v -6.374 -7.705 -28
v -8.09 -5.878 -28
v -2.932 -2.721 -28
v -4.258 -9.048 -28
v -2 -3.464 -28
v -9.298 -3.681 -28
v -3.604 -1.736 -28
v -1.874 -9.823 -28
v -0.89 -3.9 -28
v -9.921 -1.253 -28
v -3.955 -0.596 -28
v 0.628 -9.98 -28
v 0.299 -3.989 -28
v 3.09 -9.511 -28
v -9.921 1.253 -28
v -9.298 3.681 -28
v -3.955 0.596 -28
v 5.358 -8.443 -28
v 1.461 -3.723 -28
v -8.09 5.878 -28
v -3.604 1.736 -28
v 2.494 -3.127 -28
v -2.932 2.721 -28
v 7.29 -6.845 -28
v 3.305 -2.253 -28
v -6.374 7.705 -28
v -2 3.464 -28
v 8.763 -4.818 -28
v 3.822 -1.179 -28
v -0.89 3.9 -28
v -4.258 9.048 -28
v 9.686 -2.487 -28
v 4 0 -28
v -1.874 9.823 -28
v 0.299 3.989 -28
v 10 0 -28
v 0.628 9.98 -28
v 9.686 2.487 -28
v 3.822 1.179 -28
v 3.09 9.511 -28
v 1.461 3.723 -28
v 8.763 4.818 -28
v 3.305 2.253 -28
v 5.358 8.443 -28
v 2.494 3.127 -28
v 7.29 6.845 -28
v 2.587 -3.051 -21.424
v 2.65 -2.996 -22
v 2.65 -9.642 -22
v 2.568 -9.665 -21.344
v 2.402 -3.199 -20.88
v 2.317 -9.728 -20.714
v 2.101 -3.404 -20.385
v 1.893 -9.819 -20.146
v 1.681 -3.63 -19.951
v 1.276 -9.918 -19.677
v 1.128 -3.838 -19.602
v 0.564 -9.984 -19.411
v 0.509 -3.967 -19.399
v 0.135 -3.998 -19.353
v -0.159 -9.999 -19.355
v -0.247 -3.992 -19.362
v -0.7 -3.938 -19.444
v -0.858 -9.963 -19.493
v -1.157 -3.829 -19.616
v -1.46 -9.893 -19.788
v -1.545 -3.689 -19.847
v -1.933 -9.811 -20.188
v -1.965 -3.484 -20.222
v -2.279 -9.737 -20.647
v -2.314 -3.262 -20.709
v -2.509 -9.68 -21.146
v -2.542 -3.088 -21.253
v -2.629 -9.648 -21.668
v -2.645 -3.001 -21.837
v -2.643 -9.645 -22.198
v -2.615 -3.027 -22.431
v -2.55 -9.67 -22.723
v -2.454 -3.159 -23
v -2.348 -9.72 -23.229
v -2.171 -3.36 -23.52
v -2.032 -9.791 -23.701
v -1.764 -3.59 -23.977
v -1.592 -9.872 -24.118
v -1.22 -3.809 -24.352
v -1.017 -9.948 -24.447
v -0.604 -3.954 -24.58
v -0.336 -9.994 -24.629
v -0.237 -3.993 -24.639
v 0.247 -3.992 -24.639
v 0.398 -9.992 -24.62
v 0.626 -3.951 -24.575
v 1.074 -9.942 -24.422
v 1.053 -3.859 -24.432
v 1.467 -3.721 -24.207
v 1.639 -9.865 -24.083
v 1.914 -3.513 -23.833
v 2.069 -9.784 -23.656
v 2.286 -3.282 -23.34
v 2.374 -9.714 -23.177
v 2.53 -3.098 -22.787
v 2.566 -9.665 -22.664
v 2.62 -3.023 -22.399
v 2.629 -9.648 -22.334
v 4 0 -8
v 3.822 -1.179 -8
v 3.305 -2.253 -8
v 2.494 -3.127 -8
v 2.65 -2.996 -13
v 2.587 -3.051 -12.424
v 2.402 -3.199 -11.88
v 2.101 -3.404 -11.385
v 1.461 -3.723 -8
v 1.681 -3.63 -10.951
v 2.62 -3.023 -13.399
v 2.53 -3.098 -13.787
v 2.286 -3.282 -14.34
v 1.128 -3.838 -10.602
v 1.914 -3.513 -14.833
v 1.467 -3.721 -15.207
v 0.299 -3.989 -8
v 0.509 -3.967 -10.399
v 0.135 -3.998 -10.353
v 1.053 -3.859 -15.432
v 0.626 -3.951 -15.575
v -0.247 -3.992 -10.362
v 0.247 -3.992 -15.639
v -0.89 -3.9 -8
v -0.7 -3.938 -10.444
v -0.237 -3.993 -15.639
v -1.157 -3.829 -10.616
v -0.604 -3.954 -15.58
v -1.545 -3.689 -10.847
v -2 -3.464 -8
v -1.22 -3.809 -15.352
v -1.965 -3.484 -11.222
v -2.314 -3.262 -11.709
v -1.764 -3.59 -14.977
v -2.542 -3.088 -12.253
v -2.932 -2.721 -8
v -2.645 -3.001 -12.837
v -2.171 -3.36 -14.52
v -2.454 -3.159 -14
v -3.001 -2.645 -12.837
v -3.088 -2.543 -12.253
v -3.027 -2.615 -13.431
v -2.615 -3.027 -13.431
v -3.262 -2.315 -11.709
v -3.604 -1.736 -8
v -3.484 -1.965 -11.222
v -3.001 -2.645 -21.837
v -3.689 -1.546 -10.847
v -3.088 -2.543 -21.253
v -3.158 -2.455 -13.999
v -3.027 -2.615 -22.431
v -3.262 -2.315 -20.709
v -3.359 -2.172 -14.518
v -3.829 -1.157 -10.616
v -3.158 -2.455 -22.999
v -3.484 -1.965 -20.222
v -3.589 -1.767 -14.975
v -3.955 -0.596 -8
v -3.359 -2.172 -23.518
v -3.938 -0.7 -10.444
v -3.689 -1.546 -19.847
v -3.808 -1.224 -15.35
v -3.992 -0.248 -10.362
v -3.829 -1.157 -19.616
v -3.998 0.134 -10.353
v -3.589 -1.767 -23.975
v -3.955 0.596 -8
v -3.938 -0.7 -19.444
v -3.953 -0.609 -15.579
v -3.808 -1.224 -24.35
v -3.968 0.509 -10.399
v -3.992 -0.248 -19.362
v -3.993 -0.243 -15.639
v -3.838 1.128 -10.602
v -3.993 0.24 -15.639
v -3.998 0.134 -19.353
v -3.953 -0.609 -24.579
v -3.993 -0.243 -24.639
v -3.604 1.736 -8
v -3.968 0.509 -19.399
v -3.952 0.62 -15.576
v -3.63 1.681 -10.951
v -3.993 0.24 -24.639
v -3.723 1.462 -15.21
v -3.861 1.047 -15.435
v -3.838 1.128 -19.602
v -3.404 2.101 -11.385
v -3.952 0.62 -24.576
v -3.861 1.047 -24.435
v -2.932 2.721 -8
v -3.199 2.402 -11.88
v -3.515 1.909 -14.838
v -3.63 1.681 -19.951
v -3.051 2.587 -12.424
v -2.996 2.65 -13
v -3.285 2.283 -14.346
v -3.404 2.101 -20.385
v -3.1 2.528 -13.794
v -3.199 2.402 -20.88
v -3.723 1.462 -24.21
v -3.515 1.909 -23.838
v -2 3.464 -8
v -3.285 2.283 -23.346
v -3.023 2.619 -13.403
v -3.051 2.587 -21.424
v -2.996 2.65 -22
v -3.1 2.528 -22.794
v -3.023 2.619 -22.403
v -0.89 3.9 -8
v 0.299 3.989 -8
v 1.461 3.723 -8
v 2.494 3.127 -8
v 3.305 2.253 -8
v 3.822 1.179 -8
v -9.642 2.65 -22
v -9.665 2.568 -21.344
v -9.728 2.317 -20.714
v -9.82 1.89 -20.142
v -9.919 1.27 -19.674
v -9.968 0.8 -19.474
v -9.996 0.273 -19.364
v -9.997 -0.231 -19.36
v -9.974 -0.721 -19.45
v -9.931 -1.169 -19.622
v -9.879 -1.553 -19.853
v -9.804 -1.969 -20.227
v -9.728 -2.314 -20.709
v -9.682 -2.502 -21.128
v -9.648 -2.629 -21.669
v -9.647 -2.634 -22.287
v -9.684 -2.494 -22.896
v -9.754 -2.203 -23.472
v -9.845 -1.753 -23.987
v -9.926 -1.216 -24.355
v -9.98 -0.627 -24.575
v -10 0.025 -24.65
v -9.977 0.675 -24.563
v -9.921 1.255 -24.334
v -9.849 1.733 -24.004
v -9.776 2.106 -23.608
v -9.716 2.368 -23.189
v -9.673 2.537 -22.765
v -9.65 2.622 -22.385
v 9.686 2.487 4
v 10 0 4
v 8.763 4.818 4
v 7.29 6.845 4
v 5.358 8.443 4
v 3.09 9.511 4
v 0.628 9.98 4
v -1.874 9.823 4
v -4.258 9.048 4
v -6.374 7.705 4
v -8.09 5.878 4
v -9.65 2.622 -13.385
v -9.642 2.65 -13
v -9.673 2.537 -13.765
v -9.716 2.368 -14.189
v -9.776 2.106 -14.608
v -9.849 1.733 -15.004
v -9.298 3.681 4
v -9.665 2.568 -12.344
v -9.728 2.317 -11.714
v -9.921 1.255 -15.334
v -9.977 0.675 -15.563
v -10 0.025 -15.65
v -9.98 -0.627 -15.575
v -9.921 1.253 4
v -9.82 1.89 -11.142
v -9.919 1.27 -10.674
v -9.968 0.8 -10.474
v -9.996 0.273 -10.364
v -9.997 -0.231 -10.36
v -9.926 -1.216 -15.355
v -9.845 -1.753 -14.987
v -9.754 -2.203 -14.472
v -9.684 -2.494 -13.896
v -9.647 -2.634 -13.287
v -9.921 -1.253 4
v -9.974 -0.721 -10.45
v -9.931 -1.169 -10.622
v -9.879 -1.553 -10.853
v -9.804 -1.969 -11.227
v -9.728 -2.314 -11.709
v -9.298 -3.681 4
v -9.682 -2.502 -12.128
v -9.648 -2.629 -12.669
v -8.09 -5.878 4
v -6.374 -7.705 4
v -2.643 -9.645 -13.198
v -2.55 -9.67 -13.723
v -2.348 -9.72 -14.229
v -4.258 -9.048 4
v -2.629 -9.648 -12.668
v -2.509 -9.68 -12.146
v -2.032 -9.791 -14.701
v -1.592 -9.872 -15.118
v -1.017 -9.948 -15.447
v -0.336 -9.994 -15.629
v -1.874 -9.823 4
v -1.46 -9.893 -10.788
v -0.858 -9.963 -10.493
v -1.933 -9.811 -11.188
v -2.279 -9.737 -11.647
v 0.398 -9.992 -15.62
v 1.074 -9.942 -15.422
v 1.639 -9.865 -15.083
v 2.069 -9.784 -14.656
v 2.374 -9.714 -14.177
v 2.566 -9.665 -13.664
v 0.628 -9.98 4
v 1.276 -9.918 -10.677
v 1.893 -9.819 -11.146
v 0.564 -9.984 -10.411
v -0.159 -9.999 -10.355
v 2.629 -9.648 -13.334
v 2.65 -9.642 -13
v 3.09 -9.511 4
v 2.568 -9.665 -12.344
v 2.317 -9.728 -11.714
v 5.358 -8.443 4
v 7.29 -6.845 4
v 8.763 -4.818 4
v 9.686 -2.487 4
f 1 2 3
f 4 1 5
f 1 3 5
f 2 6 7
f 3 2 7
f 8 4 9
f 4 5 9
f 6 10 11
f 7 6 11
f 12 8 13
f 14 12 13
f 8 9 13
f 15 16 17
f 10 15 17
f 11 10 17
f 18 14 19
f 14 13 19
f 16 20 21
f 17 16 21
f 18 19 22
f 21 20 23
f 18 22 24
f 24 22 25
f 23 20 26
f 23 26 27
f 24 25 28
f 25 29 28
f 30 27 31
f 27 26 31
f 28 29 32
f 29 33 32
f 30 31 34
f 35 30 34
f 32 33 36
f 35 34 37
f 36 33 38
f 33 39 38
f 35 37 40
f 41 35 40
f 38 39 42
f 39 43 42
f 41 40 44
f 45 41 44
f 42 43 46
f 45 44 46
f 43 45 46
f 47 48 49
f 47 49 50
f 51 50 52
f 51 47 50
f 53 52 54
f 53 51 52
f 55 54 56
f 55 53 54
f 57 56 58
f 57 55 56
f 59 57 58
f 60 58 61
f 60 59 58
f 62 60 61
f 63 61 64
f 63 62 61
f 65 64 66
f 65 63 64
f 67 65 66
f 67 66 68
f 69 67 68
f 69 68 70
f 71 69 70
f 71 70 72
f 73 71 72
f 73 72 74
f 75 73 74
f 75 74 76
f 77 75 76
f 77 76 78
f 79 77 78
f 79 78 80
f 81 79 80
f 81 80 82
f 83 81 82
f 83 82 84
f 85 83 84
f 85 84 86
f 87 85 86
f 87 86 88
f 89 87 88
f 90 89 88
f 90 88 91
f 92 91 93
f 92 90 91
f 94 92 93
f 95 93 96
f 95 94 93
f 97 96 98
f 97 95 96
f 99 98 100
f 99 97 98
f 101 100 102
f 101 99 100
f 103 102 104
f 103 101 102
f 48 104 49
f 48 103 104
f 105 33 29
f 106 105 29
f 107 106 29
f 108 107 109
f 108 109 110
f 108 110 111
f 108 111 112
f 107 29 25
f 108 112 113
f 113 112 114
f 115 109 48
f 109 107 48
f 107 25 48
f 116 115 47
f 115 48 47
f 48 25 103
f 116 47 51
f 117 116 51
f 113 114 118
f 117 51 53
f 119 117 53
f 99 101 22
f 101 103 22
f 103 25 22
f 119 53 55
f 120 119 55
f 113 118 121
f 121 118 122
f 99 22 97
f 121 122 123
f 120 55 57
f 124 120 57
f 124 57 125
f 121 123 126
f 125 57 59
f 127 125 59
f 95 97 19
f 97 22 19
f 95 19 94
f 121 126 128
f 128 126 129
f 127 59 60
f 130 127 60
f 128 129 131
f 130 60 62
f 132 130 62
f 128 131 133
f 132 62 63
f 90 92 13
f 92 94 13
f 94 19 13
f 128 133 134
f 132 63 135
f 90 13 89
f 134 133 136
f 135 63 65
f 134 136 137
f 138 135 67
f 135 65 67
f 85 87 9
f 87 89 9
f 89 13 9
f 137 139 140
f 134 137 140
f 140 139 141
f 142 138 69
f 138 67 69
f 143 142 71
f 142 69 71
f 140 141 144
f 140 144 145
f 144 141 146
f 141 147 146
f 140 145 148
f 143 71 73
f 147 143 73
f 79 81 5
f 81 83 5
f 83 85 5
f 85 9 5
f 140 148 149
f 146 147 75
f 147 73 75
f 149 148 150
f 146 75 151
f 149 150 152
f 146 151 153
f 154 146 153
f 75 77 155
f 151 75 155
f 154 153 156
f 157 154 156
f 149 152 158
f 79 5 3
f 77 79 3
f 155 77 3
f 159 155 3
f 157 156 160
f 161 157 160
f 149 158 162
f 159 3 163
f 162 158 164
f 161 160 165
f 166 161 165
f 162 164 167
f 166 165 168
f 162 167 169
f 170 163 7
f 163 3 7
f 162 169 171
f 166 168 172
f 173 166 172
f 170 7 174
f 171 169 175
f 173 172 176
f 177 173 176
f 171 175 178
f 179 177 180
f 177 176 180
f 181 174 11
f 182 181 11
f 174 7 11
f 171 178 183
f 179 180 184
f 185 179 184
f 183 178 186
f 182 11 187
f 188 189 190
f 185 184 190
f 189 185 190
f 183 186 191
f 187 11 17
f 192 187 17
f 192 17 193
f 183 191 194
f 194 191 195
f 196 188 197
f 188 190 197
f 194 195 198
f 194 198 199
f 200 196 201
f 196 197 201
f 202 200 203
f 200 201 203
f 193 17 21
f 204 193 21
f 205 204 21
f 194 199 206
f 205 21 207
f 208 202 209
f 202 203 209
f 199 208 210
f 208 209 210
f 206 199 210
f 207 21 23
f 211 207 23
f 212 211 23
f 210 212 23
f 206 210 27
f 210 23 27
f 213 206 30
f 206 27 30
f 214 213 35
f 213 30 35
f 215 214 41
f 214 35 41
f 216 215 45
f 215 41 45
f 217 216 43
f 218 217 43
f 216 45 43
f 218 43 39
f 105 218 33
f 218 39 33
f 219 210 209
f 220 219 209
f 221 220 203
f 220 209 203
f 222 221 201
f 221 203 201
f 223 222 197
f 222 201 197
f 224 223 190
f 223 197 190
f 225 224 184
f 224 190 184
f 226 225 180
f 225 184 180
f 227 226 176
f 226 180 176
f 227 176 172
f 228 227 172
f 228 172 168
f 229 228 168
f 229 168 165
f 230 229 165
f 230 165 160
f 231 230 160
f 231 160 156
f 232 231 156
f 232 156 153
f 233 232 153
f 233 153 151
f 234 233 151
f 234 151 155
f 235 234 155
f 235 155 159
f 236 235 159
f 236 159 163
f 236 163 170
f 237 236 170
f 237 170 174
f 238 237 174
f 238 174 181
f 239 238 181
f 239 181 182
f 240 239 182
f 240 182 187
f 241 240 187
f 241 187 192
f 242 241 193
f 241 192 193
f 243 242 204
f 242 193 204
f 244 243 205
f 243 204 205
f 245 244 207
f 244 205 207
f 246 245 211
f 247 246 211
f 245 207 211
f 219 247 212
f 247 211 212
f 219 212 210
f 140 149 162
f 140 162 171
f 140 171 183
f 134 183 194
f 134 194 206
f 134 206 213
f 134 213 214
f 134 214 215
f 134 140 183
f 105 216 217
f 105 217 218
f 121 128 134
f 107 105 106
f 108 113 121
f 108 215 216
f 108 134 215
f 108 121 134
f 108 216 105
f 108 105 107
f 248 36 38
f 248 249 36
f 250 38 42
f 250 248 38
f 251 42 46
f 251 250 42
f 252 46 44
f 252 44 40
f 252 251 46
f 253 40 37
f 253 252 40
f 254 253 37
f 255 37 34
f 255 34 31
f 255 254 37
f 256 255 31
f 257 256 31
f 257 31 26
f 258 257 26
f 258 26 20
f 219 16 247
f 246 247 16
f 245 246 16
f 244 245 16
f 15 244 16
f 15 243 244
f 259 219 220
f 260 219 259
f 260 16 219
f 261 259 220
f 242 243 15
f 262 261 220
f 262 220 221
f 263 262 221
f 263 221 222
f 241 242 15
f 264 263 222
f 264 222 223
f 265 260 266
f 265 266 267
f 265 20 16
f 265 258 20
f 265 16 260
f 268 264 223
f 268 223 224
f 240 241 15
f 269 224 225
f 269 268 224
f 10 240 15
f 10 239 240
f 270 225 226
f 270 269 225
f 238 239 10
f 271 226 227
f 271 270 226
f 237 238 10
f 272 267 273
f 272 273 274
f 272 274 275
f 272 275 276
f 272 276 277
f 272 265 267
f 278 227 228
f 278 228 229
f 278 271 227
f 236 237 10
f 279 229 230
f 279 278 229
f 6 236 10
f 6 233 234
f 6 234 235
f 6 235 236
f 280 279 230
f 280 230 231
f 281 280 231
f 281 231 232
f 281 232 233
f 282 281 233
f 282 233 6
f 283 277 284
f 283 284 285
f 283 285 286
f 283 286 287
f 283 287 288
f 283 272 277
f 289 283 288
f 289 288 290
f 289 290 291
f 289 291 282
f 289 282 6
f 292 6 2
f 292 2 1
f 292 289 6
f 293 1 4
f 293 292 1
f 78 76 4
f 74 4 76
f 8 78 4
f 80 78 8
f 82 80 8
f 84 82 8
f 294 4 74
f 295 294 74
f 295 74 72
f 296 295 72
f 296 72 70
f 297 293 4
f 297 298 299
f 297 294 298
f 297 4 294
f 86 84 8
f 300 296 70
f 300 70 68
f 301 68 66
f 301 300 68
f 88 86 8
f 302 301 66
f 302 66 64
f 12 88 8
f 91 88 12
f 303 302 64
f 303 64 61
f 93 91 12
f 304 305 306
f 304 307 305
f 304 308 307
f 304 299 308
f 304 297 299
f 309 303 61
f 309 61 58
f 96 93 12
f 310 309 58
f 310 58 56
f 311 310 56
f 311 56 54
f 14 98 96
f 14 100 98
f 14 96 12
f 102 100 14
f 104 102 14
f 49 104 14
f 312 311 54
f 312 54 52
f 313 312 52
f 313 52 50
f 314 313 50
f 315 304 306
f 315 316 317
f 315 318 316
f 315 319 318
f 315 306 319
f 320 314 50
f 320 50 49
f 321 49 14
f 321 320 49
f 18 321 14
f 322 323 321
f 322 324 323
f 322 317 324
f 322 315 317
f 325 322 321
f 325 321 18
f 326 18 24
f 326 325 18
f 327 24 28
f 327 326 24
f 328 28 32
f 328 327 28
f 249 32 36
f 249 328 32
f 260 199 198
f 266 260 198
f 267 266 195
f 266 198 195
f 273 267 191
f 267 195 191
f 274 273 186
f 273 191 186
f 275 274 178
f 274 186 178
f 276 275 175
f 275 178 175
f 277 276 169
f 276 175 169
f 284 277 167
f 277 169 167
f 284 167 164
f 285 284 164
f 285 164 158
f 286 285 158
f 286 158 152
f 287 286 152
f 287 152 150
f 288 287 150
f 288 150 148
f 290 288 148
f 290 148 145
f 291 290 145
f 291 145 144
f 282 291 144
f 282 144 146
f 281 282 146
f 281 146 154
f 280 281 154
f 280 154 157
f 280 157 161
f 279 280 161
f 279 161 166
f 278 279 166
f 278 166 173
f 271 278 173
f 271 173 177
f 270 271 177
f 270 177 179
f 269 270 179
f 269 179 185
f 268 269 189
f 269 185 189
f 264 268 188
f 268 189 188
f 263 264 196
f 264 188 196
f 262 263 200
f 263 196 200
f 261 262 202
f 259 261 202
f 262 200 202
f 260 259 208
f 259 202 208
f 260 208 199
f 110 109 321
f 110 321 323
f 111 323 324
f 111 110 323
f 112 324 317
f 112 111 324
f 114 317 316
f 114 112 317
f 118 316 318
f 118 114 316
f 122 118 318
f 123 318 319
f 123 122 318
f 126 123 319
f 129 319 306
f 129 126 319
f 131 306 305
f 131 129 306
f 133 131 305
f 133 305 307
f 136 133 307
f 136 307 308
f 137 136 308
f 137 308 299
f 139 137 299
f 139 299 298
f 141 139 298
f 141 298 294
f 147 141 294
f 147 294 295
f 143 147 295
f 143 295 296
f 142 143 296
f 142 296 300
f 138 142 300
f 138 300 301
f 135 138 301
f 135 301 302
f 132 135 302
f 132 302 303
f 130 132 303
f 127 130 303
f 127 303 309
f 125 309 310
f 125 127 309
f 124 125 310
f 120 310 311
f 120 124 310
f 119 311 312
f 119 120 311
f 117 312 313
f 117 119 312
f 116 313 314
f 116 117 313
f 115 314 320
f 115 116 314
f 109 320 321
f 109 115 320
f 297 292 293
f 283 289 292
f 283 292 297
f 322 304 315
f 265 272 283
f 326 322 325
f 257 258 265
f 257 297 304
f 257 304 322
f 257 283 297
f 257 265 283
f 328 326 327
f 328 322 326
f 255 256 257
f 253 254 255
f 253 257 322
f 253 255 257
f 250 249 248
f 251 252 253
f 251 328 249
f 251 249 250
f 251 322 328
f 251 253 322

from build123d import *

# Parameters (mm, degrees)
SKETCH051_R       = 10
PAD041_DEPTH      = 4
PAD041_DEPTH_BACK = 28
SKETCH052_R       = 4
POCKET_DEPTH      = 20
SKETCH053_R       = 2.65
POCKET005_DEPTH   = 27
SKETCH054_R       = 2.65
POCKET006_DEPTH   = 11


with BuildPart() as part:
    # Sketch051 → Pad041 (new body, two sides)
    with BuildSketch(Plane.XY) as pad041_sk:
        Circle(SKETCH051_R)
    extrude(amount=PAD041_DEPTH)
    extrude(pad041_sk.sketch, amount=-PAD041_DEPTH_BACK)

    # Sketch052 (on Face2 of Pad041) → Pocket (cut)
    with BuildSketch(Plane(origin=(0, 0, -28), x_dir=(1, 0, 0), z_dir=(0, 0, -1))):
        Circle(SKETCH052_R)
    extrude(amount=-POCKET_DEPTH, mode=Mode.SUBTRACT)

    # Sketch053 → Pocket005 (cut)
    with BuildSketch(Plane.XZ):
        with Locations((0, -22)):
            Circle(SKETCH053_R)
        with Locations((0, -13)):
            Circle(SKETCH053_R)
    extrude(amount=POCKET005_DEPTH, mode=Mode.SUBTRACT)

    # Sketch054 → Pocket006 (cut)
    with BuildSketch(Plane.YZ):
        with Locations((0, -13)):
            Circle(SKETCH054_R)
        with Locations((0, -22)):
            Circle(SKETCH054_R)
    extrude(amount=-POCKET006_DEPTH, mode=Mode.SUBTRACT)


solid = part.part
